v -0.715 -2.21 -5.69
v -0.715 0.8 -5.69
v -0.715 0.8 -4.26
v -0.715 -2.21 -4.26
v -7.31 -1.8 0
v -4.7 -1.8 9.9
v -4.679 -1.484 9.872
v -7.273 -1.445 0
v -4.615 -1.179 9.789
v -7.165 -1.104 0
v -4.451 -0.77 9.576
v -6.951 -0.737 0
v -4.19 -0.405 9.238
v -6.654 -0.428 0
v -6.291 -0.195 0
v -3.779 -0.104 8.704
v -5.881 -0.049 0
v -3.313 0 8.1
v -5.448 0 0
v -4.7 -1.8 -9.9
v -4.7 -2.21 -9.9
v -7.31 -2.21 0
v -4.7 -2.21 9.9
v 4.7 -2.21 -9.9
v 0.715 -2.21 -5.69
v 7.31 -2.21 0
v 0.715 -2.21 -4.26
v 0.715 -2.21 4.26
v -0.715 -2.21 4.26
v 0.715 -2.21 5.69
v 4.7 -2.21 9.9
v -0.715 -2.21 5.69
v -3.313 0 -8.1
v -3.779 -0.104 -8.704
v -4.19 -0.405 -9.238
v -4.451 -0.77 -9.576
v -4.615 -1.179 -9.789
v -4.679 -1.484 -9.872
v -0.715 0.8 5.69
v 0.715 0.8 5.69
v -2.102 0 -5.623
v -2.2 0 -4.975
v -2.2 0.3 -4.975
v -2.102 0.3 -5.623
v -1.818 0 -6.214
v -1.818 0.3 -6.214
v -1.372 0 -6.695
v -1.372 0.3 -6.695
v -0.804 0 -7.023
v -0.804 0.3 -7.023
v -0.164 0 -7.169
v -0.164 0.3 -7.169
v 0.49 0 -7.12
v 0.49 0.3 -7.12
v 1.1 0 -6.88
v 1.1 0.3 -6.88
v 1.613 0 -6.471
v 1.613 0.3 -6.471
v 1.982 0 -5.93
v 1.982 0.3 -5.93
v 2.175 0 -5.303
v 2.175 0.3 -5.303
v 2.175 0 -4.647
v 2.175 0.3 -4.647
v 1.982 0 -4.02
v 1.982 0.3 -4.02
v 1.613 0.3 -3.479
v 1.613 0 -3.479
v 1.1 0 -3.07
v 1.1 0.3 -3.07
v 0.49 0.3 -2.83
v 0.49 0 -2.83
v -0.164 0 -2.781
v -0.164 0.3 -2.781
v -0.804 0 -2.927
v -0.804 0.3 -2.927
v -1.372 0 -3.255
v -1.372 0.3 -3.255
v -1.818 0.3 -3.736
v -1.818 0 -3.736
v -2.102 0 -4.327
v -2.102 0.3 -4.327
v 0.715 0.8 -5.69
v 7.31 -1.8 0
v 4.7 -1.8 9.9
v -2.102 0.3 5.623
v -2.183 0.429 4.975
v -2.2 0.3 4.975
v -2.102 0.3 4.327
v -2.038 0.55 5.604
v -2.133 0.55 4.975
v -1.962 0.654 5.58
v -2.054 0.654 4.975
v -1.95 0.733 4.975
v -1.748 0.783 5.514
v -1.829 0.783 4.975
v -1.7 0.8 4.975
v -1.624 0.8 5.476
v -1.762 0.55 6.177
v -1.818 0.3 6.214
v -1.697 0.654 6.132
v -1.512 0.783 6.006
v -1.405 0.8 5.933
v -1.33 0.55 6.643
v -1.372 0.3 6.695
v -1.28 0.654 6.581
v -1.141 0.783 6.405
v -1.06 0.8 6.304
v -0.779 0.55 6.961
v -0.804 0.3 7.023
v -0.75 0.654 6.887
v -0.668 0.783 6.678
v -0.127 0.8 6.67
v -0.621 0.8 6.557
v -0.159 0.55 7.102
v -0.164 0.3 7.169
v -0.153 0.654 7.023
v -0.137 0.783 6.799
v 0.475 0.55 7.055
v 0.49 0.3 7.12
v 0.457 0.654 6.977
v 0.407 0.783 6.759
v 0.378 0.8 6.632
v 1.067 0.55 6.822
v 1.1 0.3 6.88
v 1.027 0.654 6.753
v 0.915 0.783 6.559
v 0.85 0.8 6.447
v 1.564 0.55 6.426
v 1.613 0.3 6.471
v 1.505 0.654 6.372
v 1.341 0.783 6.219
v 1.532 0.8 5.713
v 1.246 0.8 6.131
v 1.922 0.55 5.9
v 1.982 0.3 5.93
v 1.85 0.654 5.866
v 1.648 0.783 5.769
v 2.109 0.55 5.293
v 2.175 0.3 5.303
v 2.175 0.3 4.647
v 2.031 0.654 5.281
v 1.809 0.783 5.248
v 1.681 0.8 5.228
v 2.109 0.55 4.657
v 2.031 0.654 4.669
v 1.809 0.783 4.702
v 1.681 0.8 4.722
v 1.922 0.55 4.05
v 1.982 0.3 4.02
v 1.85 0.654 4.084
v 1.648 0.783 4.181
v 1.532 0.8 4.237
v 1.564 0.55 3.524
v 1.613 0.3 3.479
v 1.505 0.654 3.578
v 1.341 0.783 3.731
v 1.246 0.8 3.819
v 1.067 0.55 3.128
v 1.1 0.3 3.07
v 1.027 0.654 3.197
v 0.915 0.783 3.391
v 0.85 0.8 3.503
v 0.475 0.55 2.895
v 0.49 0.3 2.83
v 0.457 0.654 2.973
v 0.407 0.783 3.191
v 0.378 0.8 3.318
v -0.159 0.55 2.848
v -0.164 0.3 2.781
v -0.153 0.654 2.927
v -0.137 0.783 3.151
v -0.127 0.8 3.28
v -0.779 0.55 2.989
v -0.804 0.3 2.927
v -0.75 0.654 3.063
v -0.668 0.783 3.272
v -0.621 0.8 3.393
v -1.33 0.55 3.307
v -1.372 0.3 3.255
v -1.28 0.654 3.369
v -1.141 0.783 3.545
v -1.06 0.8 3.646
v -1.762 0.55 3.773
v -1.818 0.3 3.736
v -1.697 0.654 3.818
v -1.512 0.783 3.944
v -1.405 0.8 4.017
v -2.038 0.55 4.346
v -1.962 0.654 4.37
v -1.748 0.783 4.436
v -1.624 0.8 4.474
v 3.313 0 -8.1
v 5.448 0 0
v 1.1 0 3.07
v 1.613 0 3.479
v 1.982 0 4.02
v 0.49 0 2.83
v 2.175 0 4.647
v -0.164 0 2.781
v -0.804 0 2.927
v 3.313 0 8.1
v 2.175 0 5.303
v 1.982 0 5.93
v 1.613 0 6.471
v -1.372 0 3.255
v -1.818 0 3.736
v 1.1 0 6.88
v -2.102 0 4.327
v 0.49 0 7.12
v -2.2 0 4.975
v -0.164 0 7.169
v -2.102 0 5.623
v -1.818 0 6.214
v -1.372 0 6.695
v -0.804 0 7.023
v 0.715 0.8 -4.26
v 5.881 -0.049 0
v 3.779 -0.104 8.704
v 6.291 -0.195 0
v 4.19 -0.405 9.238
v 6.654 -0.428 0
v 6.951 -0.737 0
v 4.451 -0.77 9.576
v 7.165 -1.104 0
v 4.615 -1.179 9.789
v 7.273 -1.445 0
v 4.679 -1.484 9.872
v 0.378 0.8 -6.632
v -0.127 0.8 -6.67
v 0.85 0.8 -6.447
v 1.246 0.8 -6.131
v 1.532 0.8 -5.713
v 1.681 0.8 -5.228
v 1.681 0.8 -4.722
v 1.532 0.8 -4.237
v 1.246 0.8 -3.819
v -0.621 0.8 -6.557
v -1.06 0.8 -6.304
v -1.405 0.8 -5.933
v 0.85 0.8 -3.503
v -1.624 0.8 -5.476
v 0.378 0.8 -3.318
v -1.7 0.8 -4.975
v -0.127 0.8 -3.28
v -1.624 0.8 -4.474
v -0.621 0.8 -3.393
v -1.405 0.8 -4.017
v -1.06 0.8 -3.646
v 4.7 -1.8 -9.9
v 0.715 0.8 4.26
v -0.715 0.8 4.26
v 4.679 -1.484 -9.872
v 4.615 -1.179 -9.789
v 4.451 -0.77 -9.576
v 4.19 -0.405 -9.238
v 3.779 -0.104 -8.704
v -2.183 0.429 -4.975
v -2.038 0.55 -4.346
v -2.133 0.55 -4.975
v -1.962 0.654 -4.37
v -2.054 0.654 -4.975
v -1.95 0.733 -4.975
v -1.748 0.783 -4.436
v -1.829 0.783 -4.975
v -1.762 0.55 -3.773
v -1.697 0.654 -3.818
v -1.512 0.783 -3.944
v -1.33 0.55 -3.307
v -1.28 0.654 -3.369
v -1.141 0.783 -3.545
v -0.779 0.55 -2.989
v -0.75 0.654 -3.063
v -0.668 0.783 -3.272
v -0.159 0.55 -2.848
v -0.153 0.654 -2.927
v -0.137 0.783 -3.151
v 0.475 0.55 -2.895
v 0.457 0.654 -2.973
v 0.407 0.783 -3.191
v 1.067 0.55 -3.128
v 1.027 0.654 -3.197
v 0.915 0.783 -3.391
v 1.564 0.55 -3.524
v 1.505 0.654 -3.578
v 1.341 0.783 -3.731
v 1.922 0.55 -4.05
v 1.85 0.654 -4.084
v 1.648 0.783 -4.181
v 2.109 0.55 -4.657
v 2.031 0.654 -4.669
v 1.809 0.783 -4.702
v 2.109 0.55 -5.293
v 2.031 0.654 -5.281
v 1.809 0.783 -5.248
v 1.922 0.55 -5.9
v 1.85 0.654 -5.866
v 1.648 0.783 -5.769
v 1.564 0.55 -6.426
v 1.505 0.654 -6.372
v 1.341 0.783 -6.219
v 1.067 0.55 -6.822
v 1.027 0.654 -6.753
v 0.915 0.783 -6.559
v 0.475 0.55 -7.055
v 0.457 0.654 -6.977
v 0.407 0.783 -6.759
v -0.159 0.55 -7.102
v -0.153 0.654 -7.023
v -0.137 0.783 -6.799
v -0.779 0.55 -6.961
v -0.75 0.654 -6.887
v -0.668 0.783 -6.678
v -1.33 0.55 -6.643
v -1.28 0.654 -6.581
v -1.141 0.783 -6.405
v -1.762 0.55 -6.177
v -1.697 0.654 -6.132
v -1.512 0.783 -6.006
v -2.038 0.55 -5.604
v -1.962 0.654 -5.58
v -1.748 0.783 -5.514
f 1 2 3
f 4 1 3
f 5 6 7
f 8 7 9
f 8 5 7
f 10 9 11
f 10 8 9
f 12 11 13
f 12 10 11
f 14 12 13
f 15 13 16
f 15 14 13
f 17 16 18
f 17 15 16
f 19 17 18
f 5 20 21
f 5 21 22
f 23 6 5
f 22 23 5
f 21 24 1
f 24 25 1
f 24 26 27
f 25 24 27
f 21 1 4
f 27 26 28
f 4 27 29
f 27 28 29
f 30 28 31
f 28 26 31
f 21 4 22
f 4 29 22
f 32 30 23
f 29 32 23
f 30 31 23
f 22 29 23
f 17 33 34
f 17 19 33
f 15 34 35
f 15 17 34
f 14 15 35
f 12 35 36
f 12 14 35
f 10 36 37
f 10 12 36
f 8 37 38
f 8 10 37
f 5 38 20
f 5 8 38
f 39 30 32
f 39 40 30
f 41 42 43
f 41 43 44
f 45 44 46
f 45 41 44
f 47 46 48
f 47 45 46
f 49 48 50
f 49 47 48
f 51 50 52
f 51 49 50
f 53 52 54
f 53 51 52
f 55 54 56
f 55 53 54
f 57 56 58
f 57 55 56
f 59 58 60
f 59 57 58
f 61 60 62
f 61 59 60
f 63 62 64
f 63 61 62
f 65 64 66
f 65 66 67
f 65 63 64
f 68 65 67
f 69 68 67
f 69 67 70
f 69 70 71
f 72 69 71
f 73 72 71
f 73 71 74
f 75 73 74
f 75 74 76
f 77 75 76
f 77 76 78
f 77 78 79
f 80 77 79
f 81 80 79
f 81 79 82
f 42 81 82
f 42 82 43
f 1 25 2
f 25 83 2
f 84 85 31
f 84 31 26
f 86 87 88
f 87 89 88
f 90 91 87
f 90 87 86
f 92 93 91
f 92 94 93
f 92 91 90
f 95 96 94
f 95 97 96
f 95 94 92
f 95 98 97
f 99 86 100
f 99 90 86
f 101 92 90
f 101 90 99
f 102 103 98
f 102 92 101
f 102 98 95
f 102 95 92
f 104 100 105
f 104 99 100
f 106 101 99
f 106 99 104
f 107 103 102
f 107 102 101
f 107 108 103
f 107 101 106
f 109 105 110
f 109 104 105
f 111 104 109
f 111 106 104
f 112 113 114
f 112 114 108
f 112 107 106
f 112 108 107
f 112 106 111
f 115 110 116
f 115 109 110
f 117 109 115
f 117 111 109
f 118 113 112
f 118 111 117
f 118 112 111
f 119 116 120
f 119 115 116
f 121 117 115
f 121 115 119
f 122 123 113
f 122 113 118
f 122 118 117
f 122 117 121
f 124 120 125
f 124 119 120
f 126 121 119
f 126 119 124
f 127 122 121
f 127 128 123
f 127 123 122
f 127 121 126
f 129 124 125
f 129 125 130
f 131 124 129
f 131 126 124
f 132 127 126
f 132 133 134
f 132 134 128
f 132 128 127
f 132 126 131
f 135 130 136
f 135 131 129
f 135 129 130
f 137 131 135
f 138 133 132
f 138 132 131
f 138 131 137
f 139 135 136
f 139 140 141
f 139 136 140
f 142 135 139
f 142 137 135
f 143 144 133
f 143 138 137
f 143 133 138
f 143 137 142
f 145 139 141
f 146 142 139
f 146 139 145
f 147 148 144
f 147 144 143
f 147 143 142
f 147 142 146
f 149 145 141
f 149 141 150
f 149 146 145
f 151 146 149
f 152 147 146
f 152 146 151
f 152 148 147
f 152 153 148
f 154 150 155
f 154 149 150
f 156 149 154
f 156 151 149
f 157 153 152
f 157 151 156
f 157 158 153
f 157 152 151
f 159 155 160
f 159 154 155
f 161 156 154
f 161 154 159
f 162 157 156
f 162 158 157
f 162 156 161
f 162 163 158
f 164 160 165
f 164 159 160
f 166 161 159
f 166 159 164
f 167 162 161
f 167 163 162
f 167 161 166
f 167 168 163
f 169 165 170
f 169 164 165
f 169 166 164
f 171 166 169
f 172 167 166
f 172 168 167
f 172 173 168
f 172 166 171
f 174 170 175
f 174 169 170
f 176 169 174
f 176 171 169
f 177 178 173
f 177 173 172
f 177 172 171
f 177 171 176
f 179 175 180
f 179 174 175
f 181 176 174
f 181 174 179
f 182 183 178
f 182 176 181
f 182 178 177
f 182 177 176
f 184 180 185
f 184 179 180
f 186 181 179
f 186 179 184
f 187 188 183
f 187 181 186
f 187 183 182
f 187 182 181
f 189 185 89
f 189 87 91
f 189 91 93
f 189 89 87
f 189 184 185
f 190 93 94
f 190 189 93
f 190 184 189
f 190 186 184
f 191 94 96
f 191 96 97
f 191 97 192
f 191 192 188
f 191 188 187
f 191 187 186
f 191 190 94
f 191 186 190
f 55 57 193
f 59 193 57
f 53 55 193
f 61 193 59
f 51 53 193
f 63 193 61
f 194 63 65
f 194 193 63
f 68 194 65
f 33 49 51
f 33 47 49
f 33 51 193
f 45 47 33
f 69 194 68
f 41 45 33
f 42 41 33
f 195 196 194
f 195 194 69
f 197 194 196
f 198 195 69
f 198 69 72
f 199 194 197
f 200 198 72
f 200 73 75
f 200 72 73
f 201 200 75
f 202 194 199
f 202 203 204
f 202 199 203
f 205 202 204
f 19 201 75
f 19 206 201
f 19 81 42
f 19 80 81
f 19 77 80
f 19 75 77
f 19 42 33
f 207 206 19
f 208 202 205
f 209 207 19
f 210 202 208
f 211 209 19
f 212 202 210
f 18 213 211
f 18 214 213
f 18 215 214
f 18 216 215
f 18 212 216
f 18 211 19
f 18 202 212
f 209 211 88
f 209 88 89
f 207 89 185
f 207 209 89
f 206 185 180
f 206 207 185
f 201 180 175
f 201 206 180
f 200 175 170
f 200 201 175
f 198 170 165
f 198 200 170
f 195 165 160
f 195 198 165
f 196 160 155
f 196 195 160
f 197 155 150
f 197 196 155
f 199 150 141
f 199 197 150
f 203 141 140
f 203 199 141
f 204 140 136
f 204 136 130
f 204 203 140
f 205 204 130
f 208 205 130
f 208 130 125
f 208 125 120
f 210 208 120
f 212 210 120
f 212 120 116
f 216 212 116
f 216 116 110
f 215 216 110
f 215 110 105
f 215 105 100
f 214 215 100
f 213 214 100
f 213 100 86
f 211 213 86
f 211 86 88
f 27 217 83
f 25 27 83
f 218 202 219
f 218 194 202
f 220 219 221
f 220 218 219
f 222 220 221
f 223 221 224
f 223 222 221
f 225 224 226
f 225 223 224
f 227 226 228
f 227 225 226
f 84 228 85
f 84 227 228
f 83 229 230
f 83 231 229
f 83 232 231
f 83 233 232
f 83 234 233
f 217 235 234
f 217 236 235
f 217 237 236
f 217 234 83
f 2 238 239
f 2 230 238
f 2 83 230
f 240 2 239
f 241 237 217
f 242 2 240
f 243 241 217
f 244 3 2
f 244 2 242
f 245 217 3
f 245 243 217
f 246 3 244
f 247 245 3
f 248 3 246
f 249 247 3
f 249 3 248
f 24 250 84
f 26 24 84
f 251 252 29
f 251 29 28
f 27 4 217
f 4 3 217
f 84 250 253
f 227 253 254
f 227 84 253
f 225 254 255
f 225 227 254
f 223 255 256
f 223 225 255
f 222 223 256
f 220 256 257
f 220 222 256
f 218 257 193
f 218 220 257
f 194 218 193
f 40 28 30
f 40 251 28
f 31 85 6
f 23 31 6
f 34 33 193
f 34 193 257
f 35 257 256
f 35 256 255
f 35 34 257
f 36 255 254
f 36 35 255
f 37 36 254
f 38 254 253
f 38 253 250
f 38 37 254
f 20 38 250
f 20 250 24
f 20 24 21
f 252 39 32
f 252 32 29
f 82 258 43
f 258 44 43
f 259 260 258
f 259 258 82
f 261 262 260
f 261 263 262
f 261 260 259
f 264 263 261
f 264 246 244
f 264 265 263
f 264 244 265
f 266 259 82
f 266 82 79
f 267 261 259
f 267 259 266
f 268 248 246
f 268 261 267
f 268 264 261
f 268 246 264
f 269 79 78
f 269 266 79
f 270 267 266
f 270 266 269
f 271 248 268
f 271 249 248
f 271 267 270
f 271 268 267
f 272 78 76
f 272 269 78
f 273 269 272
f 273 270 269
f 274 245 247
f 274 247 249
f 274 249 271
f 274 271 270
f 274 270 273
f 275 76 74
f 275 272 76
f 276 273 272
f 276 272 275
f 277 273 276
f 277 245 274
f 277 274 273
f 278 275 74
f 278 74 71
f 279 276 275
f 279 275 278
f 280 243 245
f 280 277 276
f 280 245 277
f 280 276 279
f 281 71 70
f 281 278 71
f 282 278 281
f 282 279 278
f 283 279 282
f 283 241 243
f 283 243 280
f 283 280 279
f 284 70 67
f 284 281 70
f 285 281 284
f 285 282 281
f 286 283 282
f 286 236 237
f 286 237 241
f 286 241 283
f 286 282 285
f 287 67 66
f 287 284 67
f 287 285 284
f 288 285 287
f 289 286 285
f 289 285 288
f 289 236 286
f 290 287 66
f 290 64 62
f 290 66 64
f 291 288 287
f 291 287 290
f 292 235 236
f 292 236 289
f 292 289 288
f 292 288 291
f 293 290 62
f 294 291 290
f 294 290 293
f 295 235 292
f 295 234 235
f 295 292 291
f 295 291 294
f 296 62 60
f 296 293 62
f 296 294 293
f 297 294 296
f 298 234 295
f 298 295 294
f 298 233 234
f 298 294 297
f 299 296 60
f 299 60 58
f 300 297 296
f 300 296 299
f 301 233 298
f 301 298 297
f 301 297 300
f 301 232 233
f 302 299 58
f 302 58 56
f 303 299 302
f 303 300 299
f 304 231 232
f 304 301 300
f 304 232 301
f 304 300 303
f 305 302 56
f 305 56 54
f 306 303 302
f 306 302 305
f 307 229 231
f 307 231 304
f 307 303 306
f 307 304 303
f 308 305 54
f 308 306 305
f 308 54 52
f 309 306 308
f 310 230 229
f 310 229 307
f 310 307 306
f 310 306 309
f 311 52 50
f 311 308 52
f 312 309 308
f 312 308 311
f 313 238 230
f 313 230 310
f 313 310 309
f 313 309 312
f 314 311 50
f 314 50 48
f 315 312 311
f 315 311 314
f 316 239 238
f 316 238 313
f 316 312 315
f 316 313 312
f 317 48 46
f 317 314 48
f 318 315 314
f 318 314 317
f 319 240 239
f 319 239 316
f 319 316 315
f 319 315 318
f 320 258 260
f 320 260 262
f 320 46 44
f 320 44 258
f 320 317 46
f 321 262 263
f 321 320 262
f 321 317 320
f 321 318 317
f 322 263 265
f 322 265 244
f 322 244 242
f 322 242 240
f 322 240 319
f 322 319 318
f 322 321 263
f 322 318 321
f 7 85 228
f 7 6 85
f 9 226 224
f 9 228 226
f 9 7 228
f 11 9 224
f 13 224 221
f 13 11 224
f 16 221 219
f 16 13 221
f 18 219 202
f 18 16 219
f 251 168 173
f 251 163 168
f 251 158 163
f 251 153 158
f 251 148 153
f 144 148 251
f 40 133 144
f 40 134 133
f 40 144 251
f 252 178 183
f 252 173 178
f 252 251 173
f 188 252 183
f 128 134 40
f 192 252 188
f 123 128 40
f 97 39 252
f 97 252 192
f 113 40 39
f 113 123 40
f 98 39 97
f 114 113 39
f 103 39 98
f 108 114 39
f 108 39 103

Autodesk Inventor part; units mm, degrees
ref_plane "YZ Plane" through (0, 0, 0) normal (1, 0, 0) x (0, 1, 0)
ref_plane "XZ Plane" through (0, 0, 0) normal (0, 1, 0) x (-1, 0, 0)
ref_plane "XY Plane" through (0, 0, 0) normal (0, 0, 1) x (1, 0, 0)
sketch "Sketch1" plane through (0, 0, 0) normal (0, 1, 0) x (-1, 0, 0)
  line L0 (0, 9.9) -> (0, -9.9)
  line L1 (-4.7, 9.9) -> (4.7, 9.9)
  line L2 (0, 0) -> (7.31, 0)
  line L3 (4.7, 9.9) -> (7.31, 0)
  line L4 (0, 0) -> (-7.31, 0)
  line L5 (-4.7, 9.9) -> (-7.31, 0)
  line L6 (-4.7, -9.9) -> (4.7, -9.9)
  line L7 (4.7, -9.9) -> (7.31, 0)
  line L8 (-4.7, -9.9) -> (-7.31, 0)
  line L9 (0, 9.9) -> (0, 5.69)
  line L10 (0, 5.69) -> (0.715, 5.69)
  line L11 (0.715, 5.69) -> (0.715, 4.26)
  line L12 (0.715, 4.26) -> (-0.715, 4.26)
  line L13 (-0.715, 4.26) -> (-0.715, 5.69)
  line L14 (-0.715, 5.69) -> (0, 5.69)
  circle A0 centre (0, 4.975) radius 2.2
  line L15 (0, -5.69) -> (0.715, -5.69)
  line L16 (0.715, -5.69) -> (0.715, -4.26)
  line L17 (0.715, -4.26) -> (-0.715, -4.26)
  line L18 (-0.715, -4.26) -> (-0.715, -5.69)
  line L19 (-0.715, -5.69) -> (0, -5.69)
  circle A1 centre (0, -4.975) radius 2.2
  point P0 (0, -9.9)
  dimension "d0" = 19.8
  dimension "d1" = 0
  dimension "d2" = 0
  dimension "d3" = 9.4
  dimension "d5" = 7.31
  dimension "d6" = 4.21
  dimension "d7" = 0.715
  dimension "d8" = 1.43
  dimension "d9" = 1.43
  dimension "d10" = 4.4
extrude "Extrusion1" add sketch "Sketch1" against normal blind 2.21 contours L1 L3 L2 L0 A0 | L0 A0 L4 L5 L1 | L4 L0 A1 L6 L8 | L7 L6 L0 A1 L2
extrude "Extrusion2" add sketch "Sketch1" against normal blind 2.21 contours A0 L0 L12 L11 L10 | L0 L14 L13 L12 A0 | A1 L0 L15 L16 L17 | L0 L17 L18 L19 A1
extrude "Extrusion3" add sketch "Sketch1" along normal blind 0.8 contours A0 L0 L12 L11 L10 | L0 L14 L13 L12 A0 | A1 L0 L15 L16 L17 | L0 L17 L18 L19 A1
fillet "Fillet1" radius 0.5 1 edges at (2.2, 0.8, 4.975)
fillet "Fillet2" radius 0.5 1 edges at (2.2, 0.8, -4.975)
fillet "Fillet3" radius 1.8 6 edges at (6.005, 0, -4.95) (6.005, 0, 4.95) (0, 0, -9.9) (-6.005, 0, -4.95) (-6.005, 0, 4.95) (0, 0, 9.9)
